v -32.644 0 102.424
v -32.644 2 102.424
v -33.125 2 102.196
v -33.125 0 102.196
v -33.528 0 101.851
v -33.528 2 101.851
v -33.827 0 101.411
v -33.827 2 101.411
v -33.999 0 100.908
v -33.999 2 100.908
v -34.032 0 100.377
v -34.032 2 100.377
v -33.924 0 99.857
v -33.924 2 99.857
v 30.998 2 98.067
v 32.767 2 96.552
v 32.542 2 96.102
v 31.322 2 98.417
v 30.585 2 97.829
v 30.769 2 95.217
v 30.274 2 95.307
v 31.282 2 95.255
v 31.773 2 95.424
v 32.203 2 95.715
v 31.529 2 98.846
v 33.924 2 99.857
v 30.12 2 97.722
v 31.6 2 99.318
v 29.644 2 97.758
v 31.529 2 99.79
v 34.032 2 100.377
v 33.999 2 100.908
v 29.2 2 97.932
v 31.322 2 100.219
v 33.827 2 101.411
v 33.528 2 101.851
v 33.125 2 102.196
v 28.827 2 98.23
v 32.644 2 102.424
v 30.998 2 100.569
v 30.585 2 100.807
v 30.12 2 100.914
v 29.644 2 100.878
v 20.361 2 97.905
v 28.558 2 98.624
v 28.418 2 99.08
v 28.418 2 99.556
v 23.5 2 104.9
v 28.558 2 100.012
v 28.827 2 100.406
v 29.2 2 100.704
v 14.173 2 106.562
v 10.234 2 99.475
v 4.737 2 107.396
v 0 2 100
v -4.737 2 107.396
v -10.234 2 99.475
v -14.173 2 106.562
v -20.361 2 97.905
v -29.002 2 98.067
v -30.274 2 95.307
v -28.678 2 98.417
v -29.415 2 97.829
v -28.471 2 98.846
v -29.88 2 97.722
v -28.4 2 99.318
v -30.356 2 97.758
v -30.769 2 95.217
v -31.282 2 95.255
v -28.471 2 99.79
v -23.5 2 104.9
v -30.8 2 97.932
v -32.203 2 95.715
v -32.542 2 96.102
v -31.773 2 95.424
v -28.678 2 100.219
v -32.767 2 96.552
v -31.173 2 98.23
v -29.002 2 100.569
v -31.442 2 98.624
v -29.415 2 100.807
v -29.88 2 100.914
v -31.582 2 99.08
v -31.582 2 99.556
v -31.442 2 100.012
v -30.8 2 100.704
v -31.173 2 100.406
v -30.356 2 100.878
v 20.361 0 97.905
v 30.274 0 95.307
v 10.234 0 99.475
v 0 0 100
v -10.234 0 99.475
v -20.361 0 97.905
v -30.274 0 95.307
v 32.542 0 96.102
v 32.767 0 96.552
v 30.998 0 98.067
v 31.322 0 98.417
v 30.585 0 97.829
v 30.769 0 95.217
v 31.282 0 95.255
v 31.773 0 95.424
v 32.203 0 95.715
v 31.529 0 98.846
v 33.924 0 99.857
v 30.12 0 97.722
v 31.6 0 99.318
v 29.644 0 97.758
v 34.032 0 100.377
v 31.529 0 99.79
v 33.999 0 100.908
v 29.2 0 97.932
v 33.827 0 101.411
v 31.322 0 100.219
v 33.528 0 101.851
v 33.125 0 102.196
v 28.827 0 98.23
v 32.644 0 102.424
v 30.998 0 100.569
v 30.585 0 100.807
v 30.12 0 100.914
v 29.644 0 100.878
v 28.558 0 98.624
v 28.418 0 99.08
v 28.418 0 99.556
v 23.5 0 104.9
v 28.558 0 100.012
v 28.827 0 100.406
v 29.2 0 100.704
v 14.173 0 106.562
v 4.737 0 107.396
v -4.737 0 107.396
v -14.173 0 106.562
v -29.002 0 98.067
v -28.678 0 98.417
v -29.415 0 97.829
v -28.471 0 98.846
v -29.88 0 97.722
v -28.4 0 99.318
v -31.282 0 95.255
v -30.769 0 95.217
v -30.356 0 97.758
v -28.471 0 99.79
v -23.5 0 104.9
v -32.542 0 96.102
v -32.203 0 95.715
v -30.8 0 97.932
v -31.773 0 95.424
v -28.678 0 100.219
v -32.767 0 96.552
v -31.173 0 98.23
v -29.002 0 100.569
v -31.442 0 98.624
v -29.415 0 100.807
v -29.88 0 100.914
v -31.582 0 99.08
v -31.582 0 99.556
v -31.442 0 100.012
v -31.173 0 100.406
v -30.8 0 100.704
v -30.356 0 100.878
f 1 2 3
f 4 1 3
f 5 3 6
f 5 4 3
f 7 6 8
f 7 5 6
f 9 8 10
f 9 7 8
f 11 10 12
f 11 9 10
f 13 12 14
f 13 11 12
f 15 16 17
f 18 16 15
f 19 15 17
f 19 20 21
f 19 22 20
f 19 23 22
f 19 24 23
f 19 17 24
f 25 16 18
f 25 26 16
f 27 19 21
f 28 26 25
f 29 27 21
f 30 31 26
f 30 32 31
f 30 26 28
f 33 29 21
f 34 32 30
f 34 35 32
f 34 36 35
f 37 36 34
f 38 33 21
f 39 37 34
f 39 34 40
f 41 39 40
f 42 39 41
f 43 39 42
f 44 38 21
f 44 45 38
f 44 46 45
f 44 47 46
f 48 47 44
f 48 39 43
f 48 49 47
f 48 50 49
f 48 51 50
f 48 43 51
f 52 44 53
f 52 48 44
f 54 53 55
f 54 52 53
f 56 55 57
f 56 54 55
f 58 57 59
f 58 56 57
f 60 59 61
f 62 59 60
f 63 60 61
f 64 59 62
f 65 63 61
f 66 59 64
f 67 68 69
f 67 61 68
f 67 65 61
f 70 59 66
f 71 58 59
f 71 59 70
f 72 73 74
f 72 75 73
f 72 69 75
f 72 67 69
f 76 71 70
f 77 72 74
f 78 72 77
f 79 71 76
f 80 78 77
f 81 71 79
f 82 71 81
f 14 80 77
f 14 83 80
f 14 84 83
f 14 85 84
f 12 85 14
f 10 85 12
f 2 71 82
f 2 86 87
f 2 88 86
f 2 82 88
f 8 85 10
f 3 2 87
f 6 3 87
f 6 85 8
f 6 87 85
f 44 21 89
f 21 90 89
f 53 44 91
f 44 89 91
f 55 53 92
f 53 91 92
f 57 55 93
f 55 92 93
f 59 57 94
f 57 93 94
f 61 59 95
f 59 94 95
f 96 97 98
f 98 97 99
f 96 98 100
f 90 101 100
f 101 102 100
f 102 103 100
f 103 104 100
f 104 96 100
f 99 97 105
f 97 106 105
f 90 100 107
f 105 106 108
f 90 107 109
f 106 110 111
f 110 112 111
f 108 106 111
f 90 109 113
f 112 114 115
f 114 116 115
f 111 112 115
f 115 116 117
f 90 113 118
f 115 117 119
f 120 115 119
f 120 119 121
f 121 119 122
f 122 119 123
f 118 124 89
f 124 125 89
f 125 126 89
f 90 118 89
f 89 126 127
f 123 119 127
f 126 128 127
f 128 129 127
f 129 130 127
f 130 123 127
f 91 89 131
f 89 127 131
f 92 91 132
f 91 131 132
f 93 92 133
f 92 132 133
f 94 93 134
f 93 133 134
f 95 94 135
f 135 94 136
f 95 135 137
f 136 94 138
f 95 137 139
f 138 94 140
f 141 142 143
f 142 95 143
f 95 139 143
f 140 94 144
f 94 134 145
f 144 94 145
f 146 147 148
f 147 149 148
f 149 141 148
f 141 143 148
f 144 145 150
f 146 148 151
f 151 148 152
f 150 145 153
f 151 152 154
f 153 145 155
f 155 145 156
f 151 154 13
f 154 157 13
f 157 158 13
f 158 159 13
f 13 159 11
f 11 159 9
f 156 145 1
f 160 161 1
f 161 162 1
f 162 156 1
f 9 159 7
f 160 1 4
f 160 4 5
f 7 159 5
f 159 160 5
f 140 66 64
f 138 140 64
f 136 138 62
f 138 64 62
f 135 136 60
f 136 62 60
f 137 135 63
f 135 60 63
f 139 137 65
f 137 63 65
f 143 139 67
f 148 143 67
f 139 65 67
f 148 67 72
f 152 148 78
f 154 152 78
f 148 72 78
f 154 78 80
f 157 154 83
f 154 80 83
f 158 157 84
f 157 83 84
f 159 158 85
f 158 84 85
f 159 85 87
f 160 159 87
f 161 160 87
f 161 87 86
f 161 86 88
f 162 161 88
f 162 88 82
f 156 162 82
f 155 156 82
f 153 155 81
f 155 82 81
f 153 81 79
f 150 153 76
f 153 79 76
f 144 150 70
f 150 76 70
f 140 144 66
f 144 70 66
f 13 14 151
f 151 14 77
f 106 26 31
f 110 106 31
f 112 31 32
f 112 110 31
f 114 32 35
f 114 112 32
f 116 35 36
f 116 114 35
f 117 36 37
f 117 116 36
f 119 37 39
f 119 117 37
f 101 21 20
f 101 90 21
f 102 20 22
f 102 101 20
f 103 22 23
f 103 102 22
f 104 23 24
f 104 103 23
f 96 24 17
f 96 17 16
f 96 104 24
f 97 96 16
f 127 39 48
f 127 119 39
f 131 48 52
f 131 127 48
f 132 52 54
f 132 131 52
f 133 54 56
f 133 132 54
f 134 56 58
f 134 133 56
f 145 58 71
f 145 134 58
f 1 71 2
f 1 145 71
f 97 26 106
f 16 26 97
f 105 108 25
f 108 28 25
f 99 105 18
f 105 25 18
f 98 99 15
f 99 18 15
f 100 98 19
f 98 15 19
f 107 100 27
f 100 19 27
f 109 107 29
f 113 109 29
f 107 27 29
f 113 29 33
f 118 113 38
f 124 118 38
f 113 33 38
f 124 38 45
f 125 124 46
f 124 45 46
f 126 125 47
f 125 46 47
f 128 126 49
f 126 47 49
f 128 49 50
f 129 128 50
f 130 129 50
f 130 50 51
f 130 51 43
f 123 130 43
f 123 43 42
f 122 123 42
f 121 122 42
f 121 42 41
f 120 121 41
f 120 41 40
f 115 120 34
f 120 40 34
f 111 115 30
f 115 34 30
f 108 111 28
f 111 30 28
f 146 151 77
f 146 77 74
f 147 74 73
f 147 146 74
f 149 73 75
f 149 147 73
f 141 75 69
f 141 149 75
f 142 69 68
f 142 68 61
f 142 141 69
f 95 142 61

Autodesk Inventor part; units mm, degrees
ref_plane "YZ Plane" through (0, 0, 0) normal (1, 0, 0) x (0, 1, 0)
ref_plane "XZ Plane" through (0, 0, 0) normal (0, 1, 0) x (-1, 0, 0)
ref_plane "XY Plane" through (0, 0, 0) normal (0, 0, 1) x (1, 0, 0)
sketch "Sketch1" plane through (0, 0, 0) normal (0, 1, 0) x (-1, 0, 0)
  circle A0 centre (0, 0) radius 110 construction
  arc A1 (43.0581, -98.5) -> (-43.0581, -98.5) centre (0, 0) ccw
  line L0 (0, -107.5) -> (0, -98.5) construction
  line L1 (0, -98.5) -> (0, -73.5) construction
  line L2 (0, -98.5) -> (-43.0581, -98.5) construction
  line L3 (0, -98.5) -> (43.0581, -98.5) construction
  line L4 (43.0581, -98.5) -> (-43.0581, -98.5) construction
  line L5 (-18.0581, -73.5) -> (18.0581, -73.5)
  arc A2 (43.0581, -98.5) -> (18.0581, -73.5) centre (18.0581, -98.5) ccw
  arc A3 (-18.0581, -73.5) -> (-43.0581, -98.5) centre (-18.0581, -98.5) ccw
  line L6 (0, 107.5) -> (0, 97.5) construction
  line L7 (0, 97.5) -> (-22.5, 97.5) construction
  line L8 (-22.5, 97.5) -> (-22.5, 82.5) construction
  line L9 (22.5, 82.5) -> (22.5, 97.5) construction
  line L10 (22.5, 90) -> (-22.5, 90) construction
  line L11 (15, 97.5) -> (-15, 97.5)
  line L12 (-15, 82.5) -> (15, 82.5)
  arc A4 (15, 82.5) -> (15, 97.5) centre (15, 90) ccw
  arc A5 (-15, 97.5) -> (-15, 82.5) centre (-15, 90) ccw
  line L13 (22.5, 82.5) -> (17.5, 82.5) construction
  line L14 (17.5, 82.5) -> (17.5, 77.5) construction
  circle A6 centre (17.5, 77.5) radius 1.6
  circle A7 centre (-17.5, 77.5) radius 1.6
  line L15 (-58.3363, 79.5495) -> (-79.5495, 58.3363)
  arc A8 (-47.7297, 68.9429) -> (-58.3363, 79.5495) centre (-53.033, 74.2462) ccw
  arc A9 (-79.5495, 58.3363) -> (-68.9429, 47.7297) centre (-74.2462, 53.033) ccw
  line L16 (-68.9429, 47.7297) -> (-47.7297, 68.9429)
  circle A10 centre (-67.1751, 42.4264) radius 1.6
  circle A11 centre (-42.4264, 67.1751) radius 1.6
  line L17 (-97.5, 15) -> (-97.5, -15)
  arc A12 (-82.5, 15) -> (-97.5, 15) centre (-90, 15) ccw
  arc A13 (-97.5, -15) -> (-82.5, -15) centre (-90, -15) ccw
  line L18 (-82.5, -15) -> (-82.5, 15)
  circle A14 centre (-77.5, -17.5) radius 1.6
  circle A15 centre (-77.5, 17.5) radius 1.6
  line L19 (-79.5495, -58.3363) -> (-58.3363, -79.5495)
  arc A16 (-68.9429, -47.7297) -> (-79.5495, -58.3363) centre (-74.2462, -53.033) ccw
  arc A17 (-58.3363, -79.5495) -> (-47.7297, -68.9429) centre (-53.033, -74.2462) ccw
  line L20 (-47.7297, -68.9429) -> (-68.9429, -47.7297)
  circle A18 centre (-42.4264, -67.1751) radius 1.6
  circle A19 centre (-67.1751, -42.4264) radius 1.6
  line L21 (-15, -97.5) -> (15, -97.5)
  arc A20 (-15, -82.5) -> (-15, -97.5) centre (-15, -90) ccw
  arc A21 (15, -97.5) -> (15, -82.5) centre (15, -90) ccw
  line L22 (15, -82.5) -> (-15, -82.5)
  circle A22 centre (17.5, -77.5) radius 1.6
  circle A23 centre (-17.5, -77.5) radius 1.6
  line L23 (58.3363, -79.5495) -> (79.5495, -58.3363)
  arc A24 (47.7297, -68.9429) -> (58.3363, -79.5495) centre (53.033, -74.2462) ccw
  arc A25 (79.5495, -58.3363) -> (68.9429, -47.7297) centre (74.2462, -53.033) ccw
  line L24 (68.9429, -47.7297) -> (47.7297, -68.9429)
  circle A26 centre (67.1751, -42.4264) radius 1.6
  circle A27 centre (42.4264, -67.1751) radius 1.6
  line L25 (97.5, -15) -> (97.5, 15)
  arc A28 (82.5, -15) -> (97.5, -15) centre (90, -15) ccw
  arc A29 (97.5, 15) -> (82.5, 15) centre (90, 15) ccw
  line L26 (82.5, 15) -> (82.5, -15)
  circle A30 centre (77.5, 17.5) radius 1.6
  circle A31 centre (77.5, -17.5) radius 1.6
  line L27 (79.5495, 58.3363) -> (58.3363, 79.5495)
  arc A32 (68.9429, 47.7297) -> (79.5495, 58.3363) centre (74.2462, 53.033) ccw
  arc A33 (58.3363, 79.5495) -> (47.7297, 68.9429) centre (53.033, 74.2462) ccw
  line L28 (47.7297, 68.9429) -> (68.9429, 47.7297)
  circle A34 centre (42.4264, 67.1751) radius 1.6
  circle A35 centre (67.1751, 42.4264) radius 1.6
  line L29 (58.3363, -58.3363) -> (51.2652, -51.2652) construction
  line L30 (40.6586, -61.8718) -> (61.8718, -40.6586)
  arc A36 (40.6586, -61.8718) -> (44.5267, -89.5398) centre (53.033, -74.2462) ccw
  arc A37 (89.5398, -44.5267) -> (61.8718, -40.6586) centre (74.2462, -53.033) ccw
  line L31 (0, -73.5) -> (0, -66.5) construction
  arc A38 (44.5267, 89.5398) -> (40.6586, 61.8718) centre (53.033, 74.2462) ccw
  line L32 (61.8718, 40.6586) -> (40.6586, 61.8718)
  arc A39 (61.8718, 40.6586) -> (89.5398, 44.5267) centre (74.2462, 53.033) ccw
  arc A40 (-89.5398, 44.5267) -> (-61.8718, 40.6586) centre (-74.2462, 53.033) ccw
  line L33 (-40.6586, 61.8718) -> (-61.8718, 40.6586)
  arc A41 (-40.6586, 61.8718) -> (-44.5267, 89.5398) centre (-53.033, 74.2462) ccw
  arc A42 (-44.5267, -89.5398) -> (-40.6586, -61.8718) centre (-53.033, -74.2462) ccw
  line L34 (-61.8718, -40.6586) -> (-40.6586, -61.8718)
  arc A43 (-61.8718, -40.6586) -> (-89.5398, -44.5267) centre (-74.2462, -53.033) ccw
  arc A44 (89.5398, -44.5267) -> (89.5398, 44.5267) centre (0, 0) ccw
  arc A45 (44.5267, 89.5398) -> (-44.5267, 89.5398) centre (0, 0) ccw
  arc A46 (-89.5398, 44.5267) -> (-89.5398, -44.5267) centre (0, 0) ccw
  line L35 (43.0581, -98.5) -> (48.0581, -98.5) construction
  line L36 (48.0581, -98.5) -> (48.0581, -88.5) construction
  circle A47 centre (48.0581, -88.5) radius 1.6
  circle A48 centre (-48.0581, -88.5) radius 1.6
  line L37 (18.0581, -66.5) -> (-18.0581, -66.5)
  arc A49 (17.5, -66.5) -> (43.0581, -59.4724) centre (19.5145, -23.8377) ccw
  arc A50 (-44.5267, -58.0038) -> (-18.0581, -66.5) centre (-19.5089, -25.5422) ccw
  point P0 (0, 90)
  point P1 (-45.9619, 70.7107)
  point P2 (-82.5, 17.5)
  point P3 (-70.7107, -45.9619)
  point P4 (-17.5, -82.5)
  point P5 (45.9619, -70.7107)
  point P6 (82.5, -17.5)
  point P7 (70.7107, 45.9619)
  point P8 (35.7159, -76.7698)
  dimension "d0" = 220
  dimension "d1" = 215
  dimension "d2" = 9
  dimension "d3" = 25
  dimension "d4" = 10
  dimension "d5" = 22.5
  dimension "d6" = 15
  dimension "d7" = 45
  dimension "d8" = 5
  dimension "d9" = 5
  dimension "d10" = 3.2
  dimension "d15" = 86.1162
  dimension "d16" = 45
  dimension "d19" = 360
  dimension "d22" = 10
  dimension "d23" = 7
  dimension "d26" = 360
  dimension "d33" = 5
  dimension "d34" = 10
  dimension "d35" = 3.2
extrude "Extrusion1" add sketch "Sketch1" along normal blind 2 contours A2 L5 A3 A1
fillet "Fillet2" radius 2 6 edges at (-44.5267, 1, 89.5398) (44.5267, 1, 89.5398) (89.5398, 1, 44.5267) (89.5398, 1, -44.5267) (-89.5398, 1, -44.5267) (-89.5398, 1, 44.5267)
sketch "Sketch4" plane through (0, 2, 0) normal (0, 1, 0) x (1, 0, 0)
  circle A0 centre (0, 0) radius 103.75 construction
  line L0 (0, -103.75) -> (-30, -103.75) construction
  line L1 (-30, -103.75) -> (-30, -99.318) construction
  line L2 (0, -103.75) -> (0, -91.6543) construction
  line L3 (0, 0) -> (-10.2863, 0) construction
  circle A1 centre (-30, -99.318) radius 1.6
  circle A2 centre (30, -99.318) radius 1.6
  circle A3 centre (99.318, -30) radius 1.6
  circle A4 centre (99.318, 30) radius 1.6
  circle A5 centre (-99.318, -30) radius 1.6
  circle A6 centre (-99.318, 30) radius 1.6
  dimension "d45" = 207.5
  dimension "d46" = 30
  dimension "d47" = 3.2
  dimension "d50" = 90
extrude "Extrusion4" cut sketch "Sketch4" against normal blind 2
sketch "Sketch5" plane through (0, 2, 0) normal (0, 1, 0) x (1, 0, 0)
  circle A0 centre (0, 0) radius 100
  arc A1 (-41.3697, -91.0415) -> (41.3697, -91.0415) centre (0, 0) ccw projected
  circle A2 centre (0, 0) radius 107.5
  circle A3 centre (-30, -99.318) radius 1.6 construction
  circle A4 centre (-30, -99.318) radius 1.6 construction
  circle A5 centre (30, -99.318) radius 1.6 construction
  circle A6 centre (30, -99.318) radius 1.6 construction
  circle A7 centre (-22.8014, -101.2134) radius 1.6
  arc A8 (-30, -99.318) -> (-22.8014, -101.2134) centre (0, 0) ccw construction
  line L0 (-26.4177, -100.3303) -> (-25.4629, -96.7039) construction
  line L1 (-26.4177, -100.3303) -> (-24.1782, -100.92) construction
  line L2 (-26.4177, -100.3303) -> (-27.3726, -103.9567) construction
  line L3 (0, -100) -> (0, -107.5) construction
  arc A9 (-43.0581, 98.5) -> (43.0581, 98.5) centre (0, 0) ccw construction
  line L4 (-28.3384, -103.6976) -> (-26.4299, -96.4493)
  line L5 (-26.4299, -96.4493) -> (-24.4958, -96.9585) construction
  line L6 (-24.4958, -96.9585) -> (-26.4044, -104.2068)
  line L7 (-26.4055, -104.2113) -> (-28.3396, -103.7021) construction
  line L8 (-28.3396, -103.7021) -> (-24.4958, -96.9585) construction
  line L9 (-26.4299, -96.4493) -> (-26.4055, -104.2113) construction
  line L10 (-26.4299, -96.4493) -> (-26.4286, -96.4444)
  line L11 (-24.4958, -96.9585) -> (-24.4946, -96.9537)
  line L12 (28.3384, -103.6976) -> (26.4299, -96.4493)
  line L13 (24.4958, -96.9585) -> (26.4044, -104.2068)
  line L14 (26.4299, -96.4493) -> (26.4286, -96.4444)
  line L15 (24.4958, -96.9585) -> (24.4946, -96.9537)
  circle A10 centre (22.8014, -101.2134) radius 1.6
  arc A11 (-38.542, -96.3254) -> (-30, -99.318) centre (0, 0) ccw construction
  line L16 (0, 0) -> (-38.542, -96.3254) construction
  line L17 (0, 0) -> (-30, -99.318) construction
  line L18 (-34.3036, -97.9149) -> (-40.5197, -95.7371) construction
  line L19 (-34.3036, -97.9149) -> (-33.0637, -94.3758) construction
  line L20 (-34.3036, -97.9149) -> (-35.5435, -101.454) construction
  line L21 (-34.5982, -101.7802) -> (-32.12, -94.7064)
  line L22 (-34.0075, -94.0451) -> (-36.4857, -101.1189)
  line L23 (-34.5998, -101.7846) -> (-34.0075, -94.0451) construction
  line L24 (-32.12, -94.7064) -> (-36.4873, -101.1233) construction
  line L25 (-34.0075, -94.0451) -> (-34.0059, -94.0404)
  line L26 (-32.12, -94.7064) -> (-32.1183, -94.7017)
  line L27 (34.5982, -101.7802) -> (32.12, -94.7064)
  line L28 (34.0075, -94.0451) -> (36.4857, -101.1189)
  line L29 (34.0075, -94.0451) -> (34.0059, -94.0404)
  line L30 (32.12, -94.7064) -> (32.1183, -94.7017)
  dimension "d54" = 3.2
  dimension "d56" = 90
  dimension "d57" = 90
  dimension "d58" = 2
  dimension "d62" = 5
  dimension "d63" = 90
  dimension "d64" = 90
  dimension "d65" = 2
extrude "Extrusion6" cut sketch "Sketch5" against normal blind 10 contours A0 L26 L21 A2 L22 L25 | L29 L28 A2 L27 L30 A0
fillet "Fillet4" radius 2 4 edges at (34.5982, 1, 101.7802) (32.1183, 1, 94.7017) (-34.5982, 1, 101.7802) (-32.1183, 1, 94.7017)
sketch "Sketch6" plane through (0, 2, 0) normal (0, 1, 0) x (1, 0, 0)
  line L0 (-36.4857, -101.1189) -> (-34.0059, -94.0404) projected
  line L1 (-36.4857, -101.1189) -> (-34.0059, -94.0404)
  line L2 (-34.0059, -94.0404) -> (32.6146, -91.3584)
  arc A0 (34.0059, -94.0404) -> (41.3697, -91.0415) centre (0, 0) ccw projected
  line L3 (32.6146, -91.3584) -> (34.0059, -94.0404)
  line L4 (34.0059, -94.0404) -> (36.4857, -101.1189) projected
  line L5 (34.0059, -94.0404) -> (36.4857, -101.1189)
  line L6 (36.4857, -101.1189) -> (62.3564, -110.1825)
  line L7 (62.3564, -110.1825) -> (150.1312, 20.0804)
  line L8 (150.1312, 20.0804) -> (83.4633, 106.272)
  line L9 (83.4633, 106.272) -> (-86.1797, 106.272)
  line L10 (-86.1797, 106.272) -> (-127.6527, -26.6706)
  line L11 (-127.6527, -26.6706) -> (-61.5058, -119.0367)
  line L12 (-61.5058, -119.0367) -> (-36.4857, -101.1189)
extrude "Extrusion7" cut sketch "Sketch6" against normal blind 10
properties part number "MettalringUnten_v3"
